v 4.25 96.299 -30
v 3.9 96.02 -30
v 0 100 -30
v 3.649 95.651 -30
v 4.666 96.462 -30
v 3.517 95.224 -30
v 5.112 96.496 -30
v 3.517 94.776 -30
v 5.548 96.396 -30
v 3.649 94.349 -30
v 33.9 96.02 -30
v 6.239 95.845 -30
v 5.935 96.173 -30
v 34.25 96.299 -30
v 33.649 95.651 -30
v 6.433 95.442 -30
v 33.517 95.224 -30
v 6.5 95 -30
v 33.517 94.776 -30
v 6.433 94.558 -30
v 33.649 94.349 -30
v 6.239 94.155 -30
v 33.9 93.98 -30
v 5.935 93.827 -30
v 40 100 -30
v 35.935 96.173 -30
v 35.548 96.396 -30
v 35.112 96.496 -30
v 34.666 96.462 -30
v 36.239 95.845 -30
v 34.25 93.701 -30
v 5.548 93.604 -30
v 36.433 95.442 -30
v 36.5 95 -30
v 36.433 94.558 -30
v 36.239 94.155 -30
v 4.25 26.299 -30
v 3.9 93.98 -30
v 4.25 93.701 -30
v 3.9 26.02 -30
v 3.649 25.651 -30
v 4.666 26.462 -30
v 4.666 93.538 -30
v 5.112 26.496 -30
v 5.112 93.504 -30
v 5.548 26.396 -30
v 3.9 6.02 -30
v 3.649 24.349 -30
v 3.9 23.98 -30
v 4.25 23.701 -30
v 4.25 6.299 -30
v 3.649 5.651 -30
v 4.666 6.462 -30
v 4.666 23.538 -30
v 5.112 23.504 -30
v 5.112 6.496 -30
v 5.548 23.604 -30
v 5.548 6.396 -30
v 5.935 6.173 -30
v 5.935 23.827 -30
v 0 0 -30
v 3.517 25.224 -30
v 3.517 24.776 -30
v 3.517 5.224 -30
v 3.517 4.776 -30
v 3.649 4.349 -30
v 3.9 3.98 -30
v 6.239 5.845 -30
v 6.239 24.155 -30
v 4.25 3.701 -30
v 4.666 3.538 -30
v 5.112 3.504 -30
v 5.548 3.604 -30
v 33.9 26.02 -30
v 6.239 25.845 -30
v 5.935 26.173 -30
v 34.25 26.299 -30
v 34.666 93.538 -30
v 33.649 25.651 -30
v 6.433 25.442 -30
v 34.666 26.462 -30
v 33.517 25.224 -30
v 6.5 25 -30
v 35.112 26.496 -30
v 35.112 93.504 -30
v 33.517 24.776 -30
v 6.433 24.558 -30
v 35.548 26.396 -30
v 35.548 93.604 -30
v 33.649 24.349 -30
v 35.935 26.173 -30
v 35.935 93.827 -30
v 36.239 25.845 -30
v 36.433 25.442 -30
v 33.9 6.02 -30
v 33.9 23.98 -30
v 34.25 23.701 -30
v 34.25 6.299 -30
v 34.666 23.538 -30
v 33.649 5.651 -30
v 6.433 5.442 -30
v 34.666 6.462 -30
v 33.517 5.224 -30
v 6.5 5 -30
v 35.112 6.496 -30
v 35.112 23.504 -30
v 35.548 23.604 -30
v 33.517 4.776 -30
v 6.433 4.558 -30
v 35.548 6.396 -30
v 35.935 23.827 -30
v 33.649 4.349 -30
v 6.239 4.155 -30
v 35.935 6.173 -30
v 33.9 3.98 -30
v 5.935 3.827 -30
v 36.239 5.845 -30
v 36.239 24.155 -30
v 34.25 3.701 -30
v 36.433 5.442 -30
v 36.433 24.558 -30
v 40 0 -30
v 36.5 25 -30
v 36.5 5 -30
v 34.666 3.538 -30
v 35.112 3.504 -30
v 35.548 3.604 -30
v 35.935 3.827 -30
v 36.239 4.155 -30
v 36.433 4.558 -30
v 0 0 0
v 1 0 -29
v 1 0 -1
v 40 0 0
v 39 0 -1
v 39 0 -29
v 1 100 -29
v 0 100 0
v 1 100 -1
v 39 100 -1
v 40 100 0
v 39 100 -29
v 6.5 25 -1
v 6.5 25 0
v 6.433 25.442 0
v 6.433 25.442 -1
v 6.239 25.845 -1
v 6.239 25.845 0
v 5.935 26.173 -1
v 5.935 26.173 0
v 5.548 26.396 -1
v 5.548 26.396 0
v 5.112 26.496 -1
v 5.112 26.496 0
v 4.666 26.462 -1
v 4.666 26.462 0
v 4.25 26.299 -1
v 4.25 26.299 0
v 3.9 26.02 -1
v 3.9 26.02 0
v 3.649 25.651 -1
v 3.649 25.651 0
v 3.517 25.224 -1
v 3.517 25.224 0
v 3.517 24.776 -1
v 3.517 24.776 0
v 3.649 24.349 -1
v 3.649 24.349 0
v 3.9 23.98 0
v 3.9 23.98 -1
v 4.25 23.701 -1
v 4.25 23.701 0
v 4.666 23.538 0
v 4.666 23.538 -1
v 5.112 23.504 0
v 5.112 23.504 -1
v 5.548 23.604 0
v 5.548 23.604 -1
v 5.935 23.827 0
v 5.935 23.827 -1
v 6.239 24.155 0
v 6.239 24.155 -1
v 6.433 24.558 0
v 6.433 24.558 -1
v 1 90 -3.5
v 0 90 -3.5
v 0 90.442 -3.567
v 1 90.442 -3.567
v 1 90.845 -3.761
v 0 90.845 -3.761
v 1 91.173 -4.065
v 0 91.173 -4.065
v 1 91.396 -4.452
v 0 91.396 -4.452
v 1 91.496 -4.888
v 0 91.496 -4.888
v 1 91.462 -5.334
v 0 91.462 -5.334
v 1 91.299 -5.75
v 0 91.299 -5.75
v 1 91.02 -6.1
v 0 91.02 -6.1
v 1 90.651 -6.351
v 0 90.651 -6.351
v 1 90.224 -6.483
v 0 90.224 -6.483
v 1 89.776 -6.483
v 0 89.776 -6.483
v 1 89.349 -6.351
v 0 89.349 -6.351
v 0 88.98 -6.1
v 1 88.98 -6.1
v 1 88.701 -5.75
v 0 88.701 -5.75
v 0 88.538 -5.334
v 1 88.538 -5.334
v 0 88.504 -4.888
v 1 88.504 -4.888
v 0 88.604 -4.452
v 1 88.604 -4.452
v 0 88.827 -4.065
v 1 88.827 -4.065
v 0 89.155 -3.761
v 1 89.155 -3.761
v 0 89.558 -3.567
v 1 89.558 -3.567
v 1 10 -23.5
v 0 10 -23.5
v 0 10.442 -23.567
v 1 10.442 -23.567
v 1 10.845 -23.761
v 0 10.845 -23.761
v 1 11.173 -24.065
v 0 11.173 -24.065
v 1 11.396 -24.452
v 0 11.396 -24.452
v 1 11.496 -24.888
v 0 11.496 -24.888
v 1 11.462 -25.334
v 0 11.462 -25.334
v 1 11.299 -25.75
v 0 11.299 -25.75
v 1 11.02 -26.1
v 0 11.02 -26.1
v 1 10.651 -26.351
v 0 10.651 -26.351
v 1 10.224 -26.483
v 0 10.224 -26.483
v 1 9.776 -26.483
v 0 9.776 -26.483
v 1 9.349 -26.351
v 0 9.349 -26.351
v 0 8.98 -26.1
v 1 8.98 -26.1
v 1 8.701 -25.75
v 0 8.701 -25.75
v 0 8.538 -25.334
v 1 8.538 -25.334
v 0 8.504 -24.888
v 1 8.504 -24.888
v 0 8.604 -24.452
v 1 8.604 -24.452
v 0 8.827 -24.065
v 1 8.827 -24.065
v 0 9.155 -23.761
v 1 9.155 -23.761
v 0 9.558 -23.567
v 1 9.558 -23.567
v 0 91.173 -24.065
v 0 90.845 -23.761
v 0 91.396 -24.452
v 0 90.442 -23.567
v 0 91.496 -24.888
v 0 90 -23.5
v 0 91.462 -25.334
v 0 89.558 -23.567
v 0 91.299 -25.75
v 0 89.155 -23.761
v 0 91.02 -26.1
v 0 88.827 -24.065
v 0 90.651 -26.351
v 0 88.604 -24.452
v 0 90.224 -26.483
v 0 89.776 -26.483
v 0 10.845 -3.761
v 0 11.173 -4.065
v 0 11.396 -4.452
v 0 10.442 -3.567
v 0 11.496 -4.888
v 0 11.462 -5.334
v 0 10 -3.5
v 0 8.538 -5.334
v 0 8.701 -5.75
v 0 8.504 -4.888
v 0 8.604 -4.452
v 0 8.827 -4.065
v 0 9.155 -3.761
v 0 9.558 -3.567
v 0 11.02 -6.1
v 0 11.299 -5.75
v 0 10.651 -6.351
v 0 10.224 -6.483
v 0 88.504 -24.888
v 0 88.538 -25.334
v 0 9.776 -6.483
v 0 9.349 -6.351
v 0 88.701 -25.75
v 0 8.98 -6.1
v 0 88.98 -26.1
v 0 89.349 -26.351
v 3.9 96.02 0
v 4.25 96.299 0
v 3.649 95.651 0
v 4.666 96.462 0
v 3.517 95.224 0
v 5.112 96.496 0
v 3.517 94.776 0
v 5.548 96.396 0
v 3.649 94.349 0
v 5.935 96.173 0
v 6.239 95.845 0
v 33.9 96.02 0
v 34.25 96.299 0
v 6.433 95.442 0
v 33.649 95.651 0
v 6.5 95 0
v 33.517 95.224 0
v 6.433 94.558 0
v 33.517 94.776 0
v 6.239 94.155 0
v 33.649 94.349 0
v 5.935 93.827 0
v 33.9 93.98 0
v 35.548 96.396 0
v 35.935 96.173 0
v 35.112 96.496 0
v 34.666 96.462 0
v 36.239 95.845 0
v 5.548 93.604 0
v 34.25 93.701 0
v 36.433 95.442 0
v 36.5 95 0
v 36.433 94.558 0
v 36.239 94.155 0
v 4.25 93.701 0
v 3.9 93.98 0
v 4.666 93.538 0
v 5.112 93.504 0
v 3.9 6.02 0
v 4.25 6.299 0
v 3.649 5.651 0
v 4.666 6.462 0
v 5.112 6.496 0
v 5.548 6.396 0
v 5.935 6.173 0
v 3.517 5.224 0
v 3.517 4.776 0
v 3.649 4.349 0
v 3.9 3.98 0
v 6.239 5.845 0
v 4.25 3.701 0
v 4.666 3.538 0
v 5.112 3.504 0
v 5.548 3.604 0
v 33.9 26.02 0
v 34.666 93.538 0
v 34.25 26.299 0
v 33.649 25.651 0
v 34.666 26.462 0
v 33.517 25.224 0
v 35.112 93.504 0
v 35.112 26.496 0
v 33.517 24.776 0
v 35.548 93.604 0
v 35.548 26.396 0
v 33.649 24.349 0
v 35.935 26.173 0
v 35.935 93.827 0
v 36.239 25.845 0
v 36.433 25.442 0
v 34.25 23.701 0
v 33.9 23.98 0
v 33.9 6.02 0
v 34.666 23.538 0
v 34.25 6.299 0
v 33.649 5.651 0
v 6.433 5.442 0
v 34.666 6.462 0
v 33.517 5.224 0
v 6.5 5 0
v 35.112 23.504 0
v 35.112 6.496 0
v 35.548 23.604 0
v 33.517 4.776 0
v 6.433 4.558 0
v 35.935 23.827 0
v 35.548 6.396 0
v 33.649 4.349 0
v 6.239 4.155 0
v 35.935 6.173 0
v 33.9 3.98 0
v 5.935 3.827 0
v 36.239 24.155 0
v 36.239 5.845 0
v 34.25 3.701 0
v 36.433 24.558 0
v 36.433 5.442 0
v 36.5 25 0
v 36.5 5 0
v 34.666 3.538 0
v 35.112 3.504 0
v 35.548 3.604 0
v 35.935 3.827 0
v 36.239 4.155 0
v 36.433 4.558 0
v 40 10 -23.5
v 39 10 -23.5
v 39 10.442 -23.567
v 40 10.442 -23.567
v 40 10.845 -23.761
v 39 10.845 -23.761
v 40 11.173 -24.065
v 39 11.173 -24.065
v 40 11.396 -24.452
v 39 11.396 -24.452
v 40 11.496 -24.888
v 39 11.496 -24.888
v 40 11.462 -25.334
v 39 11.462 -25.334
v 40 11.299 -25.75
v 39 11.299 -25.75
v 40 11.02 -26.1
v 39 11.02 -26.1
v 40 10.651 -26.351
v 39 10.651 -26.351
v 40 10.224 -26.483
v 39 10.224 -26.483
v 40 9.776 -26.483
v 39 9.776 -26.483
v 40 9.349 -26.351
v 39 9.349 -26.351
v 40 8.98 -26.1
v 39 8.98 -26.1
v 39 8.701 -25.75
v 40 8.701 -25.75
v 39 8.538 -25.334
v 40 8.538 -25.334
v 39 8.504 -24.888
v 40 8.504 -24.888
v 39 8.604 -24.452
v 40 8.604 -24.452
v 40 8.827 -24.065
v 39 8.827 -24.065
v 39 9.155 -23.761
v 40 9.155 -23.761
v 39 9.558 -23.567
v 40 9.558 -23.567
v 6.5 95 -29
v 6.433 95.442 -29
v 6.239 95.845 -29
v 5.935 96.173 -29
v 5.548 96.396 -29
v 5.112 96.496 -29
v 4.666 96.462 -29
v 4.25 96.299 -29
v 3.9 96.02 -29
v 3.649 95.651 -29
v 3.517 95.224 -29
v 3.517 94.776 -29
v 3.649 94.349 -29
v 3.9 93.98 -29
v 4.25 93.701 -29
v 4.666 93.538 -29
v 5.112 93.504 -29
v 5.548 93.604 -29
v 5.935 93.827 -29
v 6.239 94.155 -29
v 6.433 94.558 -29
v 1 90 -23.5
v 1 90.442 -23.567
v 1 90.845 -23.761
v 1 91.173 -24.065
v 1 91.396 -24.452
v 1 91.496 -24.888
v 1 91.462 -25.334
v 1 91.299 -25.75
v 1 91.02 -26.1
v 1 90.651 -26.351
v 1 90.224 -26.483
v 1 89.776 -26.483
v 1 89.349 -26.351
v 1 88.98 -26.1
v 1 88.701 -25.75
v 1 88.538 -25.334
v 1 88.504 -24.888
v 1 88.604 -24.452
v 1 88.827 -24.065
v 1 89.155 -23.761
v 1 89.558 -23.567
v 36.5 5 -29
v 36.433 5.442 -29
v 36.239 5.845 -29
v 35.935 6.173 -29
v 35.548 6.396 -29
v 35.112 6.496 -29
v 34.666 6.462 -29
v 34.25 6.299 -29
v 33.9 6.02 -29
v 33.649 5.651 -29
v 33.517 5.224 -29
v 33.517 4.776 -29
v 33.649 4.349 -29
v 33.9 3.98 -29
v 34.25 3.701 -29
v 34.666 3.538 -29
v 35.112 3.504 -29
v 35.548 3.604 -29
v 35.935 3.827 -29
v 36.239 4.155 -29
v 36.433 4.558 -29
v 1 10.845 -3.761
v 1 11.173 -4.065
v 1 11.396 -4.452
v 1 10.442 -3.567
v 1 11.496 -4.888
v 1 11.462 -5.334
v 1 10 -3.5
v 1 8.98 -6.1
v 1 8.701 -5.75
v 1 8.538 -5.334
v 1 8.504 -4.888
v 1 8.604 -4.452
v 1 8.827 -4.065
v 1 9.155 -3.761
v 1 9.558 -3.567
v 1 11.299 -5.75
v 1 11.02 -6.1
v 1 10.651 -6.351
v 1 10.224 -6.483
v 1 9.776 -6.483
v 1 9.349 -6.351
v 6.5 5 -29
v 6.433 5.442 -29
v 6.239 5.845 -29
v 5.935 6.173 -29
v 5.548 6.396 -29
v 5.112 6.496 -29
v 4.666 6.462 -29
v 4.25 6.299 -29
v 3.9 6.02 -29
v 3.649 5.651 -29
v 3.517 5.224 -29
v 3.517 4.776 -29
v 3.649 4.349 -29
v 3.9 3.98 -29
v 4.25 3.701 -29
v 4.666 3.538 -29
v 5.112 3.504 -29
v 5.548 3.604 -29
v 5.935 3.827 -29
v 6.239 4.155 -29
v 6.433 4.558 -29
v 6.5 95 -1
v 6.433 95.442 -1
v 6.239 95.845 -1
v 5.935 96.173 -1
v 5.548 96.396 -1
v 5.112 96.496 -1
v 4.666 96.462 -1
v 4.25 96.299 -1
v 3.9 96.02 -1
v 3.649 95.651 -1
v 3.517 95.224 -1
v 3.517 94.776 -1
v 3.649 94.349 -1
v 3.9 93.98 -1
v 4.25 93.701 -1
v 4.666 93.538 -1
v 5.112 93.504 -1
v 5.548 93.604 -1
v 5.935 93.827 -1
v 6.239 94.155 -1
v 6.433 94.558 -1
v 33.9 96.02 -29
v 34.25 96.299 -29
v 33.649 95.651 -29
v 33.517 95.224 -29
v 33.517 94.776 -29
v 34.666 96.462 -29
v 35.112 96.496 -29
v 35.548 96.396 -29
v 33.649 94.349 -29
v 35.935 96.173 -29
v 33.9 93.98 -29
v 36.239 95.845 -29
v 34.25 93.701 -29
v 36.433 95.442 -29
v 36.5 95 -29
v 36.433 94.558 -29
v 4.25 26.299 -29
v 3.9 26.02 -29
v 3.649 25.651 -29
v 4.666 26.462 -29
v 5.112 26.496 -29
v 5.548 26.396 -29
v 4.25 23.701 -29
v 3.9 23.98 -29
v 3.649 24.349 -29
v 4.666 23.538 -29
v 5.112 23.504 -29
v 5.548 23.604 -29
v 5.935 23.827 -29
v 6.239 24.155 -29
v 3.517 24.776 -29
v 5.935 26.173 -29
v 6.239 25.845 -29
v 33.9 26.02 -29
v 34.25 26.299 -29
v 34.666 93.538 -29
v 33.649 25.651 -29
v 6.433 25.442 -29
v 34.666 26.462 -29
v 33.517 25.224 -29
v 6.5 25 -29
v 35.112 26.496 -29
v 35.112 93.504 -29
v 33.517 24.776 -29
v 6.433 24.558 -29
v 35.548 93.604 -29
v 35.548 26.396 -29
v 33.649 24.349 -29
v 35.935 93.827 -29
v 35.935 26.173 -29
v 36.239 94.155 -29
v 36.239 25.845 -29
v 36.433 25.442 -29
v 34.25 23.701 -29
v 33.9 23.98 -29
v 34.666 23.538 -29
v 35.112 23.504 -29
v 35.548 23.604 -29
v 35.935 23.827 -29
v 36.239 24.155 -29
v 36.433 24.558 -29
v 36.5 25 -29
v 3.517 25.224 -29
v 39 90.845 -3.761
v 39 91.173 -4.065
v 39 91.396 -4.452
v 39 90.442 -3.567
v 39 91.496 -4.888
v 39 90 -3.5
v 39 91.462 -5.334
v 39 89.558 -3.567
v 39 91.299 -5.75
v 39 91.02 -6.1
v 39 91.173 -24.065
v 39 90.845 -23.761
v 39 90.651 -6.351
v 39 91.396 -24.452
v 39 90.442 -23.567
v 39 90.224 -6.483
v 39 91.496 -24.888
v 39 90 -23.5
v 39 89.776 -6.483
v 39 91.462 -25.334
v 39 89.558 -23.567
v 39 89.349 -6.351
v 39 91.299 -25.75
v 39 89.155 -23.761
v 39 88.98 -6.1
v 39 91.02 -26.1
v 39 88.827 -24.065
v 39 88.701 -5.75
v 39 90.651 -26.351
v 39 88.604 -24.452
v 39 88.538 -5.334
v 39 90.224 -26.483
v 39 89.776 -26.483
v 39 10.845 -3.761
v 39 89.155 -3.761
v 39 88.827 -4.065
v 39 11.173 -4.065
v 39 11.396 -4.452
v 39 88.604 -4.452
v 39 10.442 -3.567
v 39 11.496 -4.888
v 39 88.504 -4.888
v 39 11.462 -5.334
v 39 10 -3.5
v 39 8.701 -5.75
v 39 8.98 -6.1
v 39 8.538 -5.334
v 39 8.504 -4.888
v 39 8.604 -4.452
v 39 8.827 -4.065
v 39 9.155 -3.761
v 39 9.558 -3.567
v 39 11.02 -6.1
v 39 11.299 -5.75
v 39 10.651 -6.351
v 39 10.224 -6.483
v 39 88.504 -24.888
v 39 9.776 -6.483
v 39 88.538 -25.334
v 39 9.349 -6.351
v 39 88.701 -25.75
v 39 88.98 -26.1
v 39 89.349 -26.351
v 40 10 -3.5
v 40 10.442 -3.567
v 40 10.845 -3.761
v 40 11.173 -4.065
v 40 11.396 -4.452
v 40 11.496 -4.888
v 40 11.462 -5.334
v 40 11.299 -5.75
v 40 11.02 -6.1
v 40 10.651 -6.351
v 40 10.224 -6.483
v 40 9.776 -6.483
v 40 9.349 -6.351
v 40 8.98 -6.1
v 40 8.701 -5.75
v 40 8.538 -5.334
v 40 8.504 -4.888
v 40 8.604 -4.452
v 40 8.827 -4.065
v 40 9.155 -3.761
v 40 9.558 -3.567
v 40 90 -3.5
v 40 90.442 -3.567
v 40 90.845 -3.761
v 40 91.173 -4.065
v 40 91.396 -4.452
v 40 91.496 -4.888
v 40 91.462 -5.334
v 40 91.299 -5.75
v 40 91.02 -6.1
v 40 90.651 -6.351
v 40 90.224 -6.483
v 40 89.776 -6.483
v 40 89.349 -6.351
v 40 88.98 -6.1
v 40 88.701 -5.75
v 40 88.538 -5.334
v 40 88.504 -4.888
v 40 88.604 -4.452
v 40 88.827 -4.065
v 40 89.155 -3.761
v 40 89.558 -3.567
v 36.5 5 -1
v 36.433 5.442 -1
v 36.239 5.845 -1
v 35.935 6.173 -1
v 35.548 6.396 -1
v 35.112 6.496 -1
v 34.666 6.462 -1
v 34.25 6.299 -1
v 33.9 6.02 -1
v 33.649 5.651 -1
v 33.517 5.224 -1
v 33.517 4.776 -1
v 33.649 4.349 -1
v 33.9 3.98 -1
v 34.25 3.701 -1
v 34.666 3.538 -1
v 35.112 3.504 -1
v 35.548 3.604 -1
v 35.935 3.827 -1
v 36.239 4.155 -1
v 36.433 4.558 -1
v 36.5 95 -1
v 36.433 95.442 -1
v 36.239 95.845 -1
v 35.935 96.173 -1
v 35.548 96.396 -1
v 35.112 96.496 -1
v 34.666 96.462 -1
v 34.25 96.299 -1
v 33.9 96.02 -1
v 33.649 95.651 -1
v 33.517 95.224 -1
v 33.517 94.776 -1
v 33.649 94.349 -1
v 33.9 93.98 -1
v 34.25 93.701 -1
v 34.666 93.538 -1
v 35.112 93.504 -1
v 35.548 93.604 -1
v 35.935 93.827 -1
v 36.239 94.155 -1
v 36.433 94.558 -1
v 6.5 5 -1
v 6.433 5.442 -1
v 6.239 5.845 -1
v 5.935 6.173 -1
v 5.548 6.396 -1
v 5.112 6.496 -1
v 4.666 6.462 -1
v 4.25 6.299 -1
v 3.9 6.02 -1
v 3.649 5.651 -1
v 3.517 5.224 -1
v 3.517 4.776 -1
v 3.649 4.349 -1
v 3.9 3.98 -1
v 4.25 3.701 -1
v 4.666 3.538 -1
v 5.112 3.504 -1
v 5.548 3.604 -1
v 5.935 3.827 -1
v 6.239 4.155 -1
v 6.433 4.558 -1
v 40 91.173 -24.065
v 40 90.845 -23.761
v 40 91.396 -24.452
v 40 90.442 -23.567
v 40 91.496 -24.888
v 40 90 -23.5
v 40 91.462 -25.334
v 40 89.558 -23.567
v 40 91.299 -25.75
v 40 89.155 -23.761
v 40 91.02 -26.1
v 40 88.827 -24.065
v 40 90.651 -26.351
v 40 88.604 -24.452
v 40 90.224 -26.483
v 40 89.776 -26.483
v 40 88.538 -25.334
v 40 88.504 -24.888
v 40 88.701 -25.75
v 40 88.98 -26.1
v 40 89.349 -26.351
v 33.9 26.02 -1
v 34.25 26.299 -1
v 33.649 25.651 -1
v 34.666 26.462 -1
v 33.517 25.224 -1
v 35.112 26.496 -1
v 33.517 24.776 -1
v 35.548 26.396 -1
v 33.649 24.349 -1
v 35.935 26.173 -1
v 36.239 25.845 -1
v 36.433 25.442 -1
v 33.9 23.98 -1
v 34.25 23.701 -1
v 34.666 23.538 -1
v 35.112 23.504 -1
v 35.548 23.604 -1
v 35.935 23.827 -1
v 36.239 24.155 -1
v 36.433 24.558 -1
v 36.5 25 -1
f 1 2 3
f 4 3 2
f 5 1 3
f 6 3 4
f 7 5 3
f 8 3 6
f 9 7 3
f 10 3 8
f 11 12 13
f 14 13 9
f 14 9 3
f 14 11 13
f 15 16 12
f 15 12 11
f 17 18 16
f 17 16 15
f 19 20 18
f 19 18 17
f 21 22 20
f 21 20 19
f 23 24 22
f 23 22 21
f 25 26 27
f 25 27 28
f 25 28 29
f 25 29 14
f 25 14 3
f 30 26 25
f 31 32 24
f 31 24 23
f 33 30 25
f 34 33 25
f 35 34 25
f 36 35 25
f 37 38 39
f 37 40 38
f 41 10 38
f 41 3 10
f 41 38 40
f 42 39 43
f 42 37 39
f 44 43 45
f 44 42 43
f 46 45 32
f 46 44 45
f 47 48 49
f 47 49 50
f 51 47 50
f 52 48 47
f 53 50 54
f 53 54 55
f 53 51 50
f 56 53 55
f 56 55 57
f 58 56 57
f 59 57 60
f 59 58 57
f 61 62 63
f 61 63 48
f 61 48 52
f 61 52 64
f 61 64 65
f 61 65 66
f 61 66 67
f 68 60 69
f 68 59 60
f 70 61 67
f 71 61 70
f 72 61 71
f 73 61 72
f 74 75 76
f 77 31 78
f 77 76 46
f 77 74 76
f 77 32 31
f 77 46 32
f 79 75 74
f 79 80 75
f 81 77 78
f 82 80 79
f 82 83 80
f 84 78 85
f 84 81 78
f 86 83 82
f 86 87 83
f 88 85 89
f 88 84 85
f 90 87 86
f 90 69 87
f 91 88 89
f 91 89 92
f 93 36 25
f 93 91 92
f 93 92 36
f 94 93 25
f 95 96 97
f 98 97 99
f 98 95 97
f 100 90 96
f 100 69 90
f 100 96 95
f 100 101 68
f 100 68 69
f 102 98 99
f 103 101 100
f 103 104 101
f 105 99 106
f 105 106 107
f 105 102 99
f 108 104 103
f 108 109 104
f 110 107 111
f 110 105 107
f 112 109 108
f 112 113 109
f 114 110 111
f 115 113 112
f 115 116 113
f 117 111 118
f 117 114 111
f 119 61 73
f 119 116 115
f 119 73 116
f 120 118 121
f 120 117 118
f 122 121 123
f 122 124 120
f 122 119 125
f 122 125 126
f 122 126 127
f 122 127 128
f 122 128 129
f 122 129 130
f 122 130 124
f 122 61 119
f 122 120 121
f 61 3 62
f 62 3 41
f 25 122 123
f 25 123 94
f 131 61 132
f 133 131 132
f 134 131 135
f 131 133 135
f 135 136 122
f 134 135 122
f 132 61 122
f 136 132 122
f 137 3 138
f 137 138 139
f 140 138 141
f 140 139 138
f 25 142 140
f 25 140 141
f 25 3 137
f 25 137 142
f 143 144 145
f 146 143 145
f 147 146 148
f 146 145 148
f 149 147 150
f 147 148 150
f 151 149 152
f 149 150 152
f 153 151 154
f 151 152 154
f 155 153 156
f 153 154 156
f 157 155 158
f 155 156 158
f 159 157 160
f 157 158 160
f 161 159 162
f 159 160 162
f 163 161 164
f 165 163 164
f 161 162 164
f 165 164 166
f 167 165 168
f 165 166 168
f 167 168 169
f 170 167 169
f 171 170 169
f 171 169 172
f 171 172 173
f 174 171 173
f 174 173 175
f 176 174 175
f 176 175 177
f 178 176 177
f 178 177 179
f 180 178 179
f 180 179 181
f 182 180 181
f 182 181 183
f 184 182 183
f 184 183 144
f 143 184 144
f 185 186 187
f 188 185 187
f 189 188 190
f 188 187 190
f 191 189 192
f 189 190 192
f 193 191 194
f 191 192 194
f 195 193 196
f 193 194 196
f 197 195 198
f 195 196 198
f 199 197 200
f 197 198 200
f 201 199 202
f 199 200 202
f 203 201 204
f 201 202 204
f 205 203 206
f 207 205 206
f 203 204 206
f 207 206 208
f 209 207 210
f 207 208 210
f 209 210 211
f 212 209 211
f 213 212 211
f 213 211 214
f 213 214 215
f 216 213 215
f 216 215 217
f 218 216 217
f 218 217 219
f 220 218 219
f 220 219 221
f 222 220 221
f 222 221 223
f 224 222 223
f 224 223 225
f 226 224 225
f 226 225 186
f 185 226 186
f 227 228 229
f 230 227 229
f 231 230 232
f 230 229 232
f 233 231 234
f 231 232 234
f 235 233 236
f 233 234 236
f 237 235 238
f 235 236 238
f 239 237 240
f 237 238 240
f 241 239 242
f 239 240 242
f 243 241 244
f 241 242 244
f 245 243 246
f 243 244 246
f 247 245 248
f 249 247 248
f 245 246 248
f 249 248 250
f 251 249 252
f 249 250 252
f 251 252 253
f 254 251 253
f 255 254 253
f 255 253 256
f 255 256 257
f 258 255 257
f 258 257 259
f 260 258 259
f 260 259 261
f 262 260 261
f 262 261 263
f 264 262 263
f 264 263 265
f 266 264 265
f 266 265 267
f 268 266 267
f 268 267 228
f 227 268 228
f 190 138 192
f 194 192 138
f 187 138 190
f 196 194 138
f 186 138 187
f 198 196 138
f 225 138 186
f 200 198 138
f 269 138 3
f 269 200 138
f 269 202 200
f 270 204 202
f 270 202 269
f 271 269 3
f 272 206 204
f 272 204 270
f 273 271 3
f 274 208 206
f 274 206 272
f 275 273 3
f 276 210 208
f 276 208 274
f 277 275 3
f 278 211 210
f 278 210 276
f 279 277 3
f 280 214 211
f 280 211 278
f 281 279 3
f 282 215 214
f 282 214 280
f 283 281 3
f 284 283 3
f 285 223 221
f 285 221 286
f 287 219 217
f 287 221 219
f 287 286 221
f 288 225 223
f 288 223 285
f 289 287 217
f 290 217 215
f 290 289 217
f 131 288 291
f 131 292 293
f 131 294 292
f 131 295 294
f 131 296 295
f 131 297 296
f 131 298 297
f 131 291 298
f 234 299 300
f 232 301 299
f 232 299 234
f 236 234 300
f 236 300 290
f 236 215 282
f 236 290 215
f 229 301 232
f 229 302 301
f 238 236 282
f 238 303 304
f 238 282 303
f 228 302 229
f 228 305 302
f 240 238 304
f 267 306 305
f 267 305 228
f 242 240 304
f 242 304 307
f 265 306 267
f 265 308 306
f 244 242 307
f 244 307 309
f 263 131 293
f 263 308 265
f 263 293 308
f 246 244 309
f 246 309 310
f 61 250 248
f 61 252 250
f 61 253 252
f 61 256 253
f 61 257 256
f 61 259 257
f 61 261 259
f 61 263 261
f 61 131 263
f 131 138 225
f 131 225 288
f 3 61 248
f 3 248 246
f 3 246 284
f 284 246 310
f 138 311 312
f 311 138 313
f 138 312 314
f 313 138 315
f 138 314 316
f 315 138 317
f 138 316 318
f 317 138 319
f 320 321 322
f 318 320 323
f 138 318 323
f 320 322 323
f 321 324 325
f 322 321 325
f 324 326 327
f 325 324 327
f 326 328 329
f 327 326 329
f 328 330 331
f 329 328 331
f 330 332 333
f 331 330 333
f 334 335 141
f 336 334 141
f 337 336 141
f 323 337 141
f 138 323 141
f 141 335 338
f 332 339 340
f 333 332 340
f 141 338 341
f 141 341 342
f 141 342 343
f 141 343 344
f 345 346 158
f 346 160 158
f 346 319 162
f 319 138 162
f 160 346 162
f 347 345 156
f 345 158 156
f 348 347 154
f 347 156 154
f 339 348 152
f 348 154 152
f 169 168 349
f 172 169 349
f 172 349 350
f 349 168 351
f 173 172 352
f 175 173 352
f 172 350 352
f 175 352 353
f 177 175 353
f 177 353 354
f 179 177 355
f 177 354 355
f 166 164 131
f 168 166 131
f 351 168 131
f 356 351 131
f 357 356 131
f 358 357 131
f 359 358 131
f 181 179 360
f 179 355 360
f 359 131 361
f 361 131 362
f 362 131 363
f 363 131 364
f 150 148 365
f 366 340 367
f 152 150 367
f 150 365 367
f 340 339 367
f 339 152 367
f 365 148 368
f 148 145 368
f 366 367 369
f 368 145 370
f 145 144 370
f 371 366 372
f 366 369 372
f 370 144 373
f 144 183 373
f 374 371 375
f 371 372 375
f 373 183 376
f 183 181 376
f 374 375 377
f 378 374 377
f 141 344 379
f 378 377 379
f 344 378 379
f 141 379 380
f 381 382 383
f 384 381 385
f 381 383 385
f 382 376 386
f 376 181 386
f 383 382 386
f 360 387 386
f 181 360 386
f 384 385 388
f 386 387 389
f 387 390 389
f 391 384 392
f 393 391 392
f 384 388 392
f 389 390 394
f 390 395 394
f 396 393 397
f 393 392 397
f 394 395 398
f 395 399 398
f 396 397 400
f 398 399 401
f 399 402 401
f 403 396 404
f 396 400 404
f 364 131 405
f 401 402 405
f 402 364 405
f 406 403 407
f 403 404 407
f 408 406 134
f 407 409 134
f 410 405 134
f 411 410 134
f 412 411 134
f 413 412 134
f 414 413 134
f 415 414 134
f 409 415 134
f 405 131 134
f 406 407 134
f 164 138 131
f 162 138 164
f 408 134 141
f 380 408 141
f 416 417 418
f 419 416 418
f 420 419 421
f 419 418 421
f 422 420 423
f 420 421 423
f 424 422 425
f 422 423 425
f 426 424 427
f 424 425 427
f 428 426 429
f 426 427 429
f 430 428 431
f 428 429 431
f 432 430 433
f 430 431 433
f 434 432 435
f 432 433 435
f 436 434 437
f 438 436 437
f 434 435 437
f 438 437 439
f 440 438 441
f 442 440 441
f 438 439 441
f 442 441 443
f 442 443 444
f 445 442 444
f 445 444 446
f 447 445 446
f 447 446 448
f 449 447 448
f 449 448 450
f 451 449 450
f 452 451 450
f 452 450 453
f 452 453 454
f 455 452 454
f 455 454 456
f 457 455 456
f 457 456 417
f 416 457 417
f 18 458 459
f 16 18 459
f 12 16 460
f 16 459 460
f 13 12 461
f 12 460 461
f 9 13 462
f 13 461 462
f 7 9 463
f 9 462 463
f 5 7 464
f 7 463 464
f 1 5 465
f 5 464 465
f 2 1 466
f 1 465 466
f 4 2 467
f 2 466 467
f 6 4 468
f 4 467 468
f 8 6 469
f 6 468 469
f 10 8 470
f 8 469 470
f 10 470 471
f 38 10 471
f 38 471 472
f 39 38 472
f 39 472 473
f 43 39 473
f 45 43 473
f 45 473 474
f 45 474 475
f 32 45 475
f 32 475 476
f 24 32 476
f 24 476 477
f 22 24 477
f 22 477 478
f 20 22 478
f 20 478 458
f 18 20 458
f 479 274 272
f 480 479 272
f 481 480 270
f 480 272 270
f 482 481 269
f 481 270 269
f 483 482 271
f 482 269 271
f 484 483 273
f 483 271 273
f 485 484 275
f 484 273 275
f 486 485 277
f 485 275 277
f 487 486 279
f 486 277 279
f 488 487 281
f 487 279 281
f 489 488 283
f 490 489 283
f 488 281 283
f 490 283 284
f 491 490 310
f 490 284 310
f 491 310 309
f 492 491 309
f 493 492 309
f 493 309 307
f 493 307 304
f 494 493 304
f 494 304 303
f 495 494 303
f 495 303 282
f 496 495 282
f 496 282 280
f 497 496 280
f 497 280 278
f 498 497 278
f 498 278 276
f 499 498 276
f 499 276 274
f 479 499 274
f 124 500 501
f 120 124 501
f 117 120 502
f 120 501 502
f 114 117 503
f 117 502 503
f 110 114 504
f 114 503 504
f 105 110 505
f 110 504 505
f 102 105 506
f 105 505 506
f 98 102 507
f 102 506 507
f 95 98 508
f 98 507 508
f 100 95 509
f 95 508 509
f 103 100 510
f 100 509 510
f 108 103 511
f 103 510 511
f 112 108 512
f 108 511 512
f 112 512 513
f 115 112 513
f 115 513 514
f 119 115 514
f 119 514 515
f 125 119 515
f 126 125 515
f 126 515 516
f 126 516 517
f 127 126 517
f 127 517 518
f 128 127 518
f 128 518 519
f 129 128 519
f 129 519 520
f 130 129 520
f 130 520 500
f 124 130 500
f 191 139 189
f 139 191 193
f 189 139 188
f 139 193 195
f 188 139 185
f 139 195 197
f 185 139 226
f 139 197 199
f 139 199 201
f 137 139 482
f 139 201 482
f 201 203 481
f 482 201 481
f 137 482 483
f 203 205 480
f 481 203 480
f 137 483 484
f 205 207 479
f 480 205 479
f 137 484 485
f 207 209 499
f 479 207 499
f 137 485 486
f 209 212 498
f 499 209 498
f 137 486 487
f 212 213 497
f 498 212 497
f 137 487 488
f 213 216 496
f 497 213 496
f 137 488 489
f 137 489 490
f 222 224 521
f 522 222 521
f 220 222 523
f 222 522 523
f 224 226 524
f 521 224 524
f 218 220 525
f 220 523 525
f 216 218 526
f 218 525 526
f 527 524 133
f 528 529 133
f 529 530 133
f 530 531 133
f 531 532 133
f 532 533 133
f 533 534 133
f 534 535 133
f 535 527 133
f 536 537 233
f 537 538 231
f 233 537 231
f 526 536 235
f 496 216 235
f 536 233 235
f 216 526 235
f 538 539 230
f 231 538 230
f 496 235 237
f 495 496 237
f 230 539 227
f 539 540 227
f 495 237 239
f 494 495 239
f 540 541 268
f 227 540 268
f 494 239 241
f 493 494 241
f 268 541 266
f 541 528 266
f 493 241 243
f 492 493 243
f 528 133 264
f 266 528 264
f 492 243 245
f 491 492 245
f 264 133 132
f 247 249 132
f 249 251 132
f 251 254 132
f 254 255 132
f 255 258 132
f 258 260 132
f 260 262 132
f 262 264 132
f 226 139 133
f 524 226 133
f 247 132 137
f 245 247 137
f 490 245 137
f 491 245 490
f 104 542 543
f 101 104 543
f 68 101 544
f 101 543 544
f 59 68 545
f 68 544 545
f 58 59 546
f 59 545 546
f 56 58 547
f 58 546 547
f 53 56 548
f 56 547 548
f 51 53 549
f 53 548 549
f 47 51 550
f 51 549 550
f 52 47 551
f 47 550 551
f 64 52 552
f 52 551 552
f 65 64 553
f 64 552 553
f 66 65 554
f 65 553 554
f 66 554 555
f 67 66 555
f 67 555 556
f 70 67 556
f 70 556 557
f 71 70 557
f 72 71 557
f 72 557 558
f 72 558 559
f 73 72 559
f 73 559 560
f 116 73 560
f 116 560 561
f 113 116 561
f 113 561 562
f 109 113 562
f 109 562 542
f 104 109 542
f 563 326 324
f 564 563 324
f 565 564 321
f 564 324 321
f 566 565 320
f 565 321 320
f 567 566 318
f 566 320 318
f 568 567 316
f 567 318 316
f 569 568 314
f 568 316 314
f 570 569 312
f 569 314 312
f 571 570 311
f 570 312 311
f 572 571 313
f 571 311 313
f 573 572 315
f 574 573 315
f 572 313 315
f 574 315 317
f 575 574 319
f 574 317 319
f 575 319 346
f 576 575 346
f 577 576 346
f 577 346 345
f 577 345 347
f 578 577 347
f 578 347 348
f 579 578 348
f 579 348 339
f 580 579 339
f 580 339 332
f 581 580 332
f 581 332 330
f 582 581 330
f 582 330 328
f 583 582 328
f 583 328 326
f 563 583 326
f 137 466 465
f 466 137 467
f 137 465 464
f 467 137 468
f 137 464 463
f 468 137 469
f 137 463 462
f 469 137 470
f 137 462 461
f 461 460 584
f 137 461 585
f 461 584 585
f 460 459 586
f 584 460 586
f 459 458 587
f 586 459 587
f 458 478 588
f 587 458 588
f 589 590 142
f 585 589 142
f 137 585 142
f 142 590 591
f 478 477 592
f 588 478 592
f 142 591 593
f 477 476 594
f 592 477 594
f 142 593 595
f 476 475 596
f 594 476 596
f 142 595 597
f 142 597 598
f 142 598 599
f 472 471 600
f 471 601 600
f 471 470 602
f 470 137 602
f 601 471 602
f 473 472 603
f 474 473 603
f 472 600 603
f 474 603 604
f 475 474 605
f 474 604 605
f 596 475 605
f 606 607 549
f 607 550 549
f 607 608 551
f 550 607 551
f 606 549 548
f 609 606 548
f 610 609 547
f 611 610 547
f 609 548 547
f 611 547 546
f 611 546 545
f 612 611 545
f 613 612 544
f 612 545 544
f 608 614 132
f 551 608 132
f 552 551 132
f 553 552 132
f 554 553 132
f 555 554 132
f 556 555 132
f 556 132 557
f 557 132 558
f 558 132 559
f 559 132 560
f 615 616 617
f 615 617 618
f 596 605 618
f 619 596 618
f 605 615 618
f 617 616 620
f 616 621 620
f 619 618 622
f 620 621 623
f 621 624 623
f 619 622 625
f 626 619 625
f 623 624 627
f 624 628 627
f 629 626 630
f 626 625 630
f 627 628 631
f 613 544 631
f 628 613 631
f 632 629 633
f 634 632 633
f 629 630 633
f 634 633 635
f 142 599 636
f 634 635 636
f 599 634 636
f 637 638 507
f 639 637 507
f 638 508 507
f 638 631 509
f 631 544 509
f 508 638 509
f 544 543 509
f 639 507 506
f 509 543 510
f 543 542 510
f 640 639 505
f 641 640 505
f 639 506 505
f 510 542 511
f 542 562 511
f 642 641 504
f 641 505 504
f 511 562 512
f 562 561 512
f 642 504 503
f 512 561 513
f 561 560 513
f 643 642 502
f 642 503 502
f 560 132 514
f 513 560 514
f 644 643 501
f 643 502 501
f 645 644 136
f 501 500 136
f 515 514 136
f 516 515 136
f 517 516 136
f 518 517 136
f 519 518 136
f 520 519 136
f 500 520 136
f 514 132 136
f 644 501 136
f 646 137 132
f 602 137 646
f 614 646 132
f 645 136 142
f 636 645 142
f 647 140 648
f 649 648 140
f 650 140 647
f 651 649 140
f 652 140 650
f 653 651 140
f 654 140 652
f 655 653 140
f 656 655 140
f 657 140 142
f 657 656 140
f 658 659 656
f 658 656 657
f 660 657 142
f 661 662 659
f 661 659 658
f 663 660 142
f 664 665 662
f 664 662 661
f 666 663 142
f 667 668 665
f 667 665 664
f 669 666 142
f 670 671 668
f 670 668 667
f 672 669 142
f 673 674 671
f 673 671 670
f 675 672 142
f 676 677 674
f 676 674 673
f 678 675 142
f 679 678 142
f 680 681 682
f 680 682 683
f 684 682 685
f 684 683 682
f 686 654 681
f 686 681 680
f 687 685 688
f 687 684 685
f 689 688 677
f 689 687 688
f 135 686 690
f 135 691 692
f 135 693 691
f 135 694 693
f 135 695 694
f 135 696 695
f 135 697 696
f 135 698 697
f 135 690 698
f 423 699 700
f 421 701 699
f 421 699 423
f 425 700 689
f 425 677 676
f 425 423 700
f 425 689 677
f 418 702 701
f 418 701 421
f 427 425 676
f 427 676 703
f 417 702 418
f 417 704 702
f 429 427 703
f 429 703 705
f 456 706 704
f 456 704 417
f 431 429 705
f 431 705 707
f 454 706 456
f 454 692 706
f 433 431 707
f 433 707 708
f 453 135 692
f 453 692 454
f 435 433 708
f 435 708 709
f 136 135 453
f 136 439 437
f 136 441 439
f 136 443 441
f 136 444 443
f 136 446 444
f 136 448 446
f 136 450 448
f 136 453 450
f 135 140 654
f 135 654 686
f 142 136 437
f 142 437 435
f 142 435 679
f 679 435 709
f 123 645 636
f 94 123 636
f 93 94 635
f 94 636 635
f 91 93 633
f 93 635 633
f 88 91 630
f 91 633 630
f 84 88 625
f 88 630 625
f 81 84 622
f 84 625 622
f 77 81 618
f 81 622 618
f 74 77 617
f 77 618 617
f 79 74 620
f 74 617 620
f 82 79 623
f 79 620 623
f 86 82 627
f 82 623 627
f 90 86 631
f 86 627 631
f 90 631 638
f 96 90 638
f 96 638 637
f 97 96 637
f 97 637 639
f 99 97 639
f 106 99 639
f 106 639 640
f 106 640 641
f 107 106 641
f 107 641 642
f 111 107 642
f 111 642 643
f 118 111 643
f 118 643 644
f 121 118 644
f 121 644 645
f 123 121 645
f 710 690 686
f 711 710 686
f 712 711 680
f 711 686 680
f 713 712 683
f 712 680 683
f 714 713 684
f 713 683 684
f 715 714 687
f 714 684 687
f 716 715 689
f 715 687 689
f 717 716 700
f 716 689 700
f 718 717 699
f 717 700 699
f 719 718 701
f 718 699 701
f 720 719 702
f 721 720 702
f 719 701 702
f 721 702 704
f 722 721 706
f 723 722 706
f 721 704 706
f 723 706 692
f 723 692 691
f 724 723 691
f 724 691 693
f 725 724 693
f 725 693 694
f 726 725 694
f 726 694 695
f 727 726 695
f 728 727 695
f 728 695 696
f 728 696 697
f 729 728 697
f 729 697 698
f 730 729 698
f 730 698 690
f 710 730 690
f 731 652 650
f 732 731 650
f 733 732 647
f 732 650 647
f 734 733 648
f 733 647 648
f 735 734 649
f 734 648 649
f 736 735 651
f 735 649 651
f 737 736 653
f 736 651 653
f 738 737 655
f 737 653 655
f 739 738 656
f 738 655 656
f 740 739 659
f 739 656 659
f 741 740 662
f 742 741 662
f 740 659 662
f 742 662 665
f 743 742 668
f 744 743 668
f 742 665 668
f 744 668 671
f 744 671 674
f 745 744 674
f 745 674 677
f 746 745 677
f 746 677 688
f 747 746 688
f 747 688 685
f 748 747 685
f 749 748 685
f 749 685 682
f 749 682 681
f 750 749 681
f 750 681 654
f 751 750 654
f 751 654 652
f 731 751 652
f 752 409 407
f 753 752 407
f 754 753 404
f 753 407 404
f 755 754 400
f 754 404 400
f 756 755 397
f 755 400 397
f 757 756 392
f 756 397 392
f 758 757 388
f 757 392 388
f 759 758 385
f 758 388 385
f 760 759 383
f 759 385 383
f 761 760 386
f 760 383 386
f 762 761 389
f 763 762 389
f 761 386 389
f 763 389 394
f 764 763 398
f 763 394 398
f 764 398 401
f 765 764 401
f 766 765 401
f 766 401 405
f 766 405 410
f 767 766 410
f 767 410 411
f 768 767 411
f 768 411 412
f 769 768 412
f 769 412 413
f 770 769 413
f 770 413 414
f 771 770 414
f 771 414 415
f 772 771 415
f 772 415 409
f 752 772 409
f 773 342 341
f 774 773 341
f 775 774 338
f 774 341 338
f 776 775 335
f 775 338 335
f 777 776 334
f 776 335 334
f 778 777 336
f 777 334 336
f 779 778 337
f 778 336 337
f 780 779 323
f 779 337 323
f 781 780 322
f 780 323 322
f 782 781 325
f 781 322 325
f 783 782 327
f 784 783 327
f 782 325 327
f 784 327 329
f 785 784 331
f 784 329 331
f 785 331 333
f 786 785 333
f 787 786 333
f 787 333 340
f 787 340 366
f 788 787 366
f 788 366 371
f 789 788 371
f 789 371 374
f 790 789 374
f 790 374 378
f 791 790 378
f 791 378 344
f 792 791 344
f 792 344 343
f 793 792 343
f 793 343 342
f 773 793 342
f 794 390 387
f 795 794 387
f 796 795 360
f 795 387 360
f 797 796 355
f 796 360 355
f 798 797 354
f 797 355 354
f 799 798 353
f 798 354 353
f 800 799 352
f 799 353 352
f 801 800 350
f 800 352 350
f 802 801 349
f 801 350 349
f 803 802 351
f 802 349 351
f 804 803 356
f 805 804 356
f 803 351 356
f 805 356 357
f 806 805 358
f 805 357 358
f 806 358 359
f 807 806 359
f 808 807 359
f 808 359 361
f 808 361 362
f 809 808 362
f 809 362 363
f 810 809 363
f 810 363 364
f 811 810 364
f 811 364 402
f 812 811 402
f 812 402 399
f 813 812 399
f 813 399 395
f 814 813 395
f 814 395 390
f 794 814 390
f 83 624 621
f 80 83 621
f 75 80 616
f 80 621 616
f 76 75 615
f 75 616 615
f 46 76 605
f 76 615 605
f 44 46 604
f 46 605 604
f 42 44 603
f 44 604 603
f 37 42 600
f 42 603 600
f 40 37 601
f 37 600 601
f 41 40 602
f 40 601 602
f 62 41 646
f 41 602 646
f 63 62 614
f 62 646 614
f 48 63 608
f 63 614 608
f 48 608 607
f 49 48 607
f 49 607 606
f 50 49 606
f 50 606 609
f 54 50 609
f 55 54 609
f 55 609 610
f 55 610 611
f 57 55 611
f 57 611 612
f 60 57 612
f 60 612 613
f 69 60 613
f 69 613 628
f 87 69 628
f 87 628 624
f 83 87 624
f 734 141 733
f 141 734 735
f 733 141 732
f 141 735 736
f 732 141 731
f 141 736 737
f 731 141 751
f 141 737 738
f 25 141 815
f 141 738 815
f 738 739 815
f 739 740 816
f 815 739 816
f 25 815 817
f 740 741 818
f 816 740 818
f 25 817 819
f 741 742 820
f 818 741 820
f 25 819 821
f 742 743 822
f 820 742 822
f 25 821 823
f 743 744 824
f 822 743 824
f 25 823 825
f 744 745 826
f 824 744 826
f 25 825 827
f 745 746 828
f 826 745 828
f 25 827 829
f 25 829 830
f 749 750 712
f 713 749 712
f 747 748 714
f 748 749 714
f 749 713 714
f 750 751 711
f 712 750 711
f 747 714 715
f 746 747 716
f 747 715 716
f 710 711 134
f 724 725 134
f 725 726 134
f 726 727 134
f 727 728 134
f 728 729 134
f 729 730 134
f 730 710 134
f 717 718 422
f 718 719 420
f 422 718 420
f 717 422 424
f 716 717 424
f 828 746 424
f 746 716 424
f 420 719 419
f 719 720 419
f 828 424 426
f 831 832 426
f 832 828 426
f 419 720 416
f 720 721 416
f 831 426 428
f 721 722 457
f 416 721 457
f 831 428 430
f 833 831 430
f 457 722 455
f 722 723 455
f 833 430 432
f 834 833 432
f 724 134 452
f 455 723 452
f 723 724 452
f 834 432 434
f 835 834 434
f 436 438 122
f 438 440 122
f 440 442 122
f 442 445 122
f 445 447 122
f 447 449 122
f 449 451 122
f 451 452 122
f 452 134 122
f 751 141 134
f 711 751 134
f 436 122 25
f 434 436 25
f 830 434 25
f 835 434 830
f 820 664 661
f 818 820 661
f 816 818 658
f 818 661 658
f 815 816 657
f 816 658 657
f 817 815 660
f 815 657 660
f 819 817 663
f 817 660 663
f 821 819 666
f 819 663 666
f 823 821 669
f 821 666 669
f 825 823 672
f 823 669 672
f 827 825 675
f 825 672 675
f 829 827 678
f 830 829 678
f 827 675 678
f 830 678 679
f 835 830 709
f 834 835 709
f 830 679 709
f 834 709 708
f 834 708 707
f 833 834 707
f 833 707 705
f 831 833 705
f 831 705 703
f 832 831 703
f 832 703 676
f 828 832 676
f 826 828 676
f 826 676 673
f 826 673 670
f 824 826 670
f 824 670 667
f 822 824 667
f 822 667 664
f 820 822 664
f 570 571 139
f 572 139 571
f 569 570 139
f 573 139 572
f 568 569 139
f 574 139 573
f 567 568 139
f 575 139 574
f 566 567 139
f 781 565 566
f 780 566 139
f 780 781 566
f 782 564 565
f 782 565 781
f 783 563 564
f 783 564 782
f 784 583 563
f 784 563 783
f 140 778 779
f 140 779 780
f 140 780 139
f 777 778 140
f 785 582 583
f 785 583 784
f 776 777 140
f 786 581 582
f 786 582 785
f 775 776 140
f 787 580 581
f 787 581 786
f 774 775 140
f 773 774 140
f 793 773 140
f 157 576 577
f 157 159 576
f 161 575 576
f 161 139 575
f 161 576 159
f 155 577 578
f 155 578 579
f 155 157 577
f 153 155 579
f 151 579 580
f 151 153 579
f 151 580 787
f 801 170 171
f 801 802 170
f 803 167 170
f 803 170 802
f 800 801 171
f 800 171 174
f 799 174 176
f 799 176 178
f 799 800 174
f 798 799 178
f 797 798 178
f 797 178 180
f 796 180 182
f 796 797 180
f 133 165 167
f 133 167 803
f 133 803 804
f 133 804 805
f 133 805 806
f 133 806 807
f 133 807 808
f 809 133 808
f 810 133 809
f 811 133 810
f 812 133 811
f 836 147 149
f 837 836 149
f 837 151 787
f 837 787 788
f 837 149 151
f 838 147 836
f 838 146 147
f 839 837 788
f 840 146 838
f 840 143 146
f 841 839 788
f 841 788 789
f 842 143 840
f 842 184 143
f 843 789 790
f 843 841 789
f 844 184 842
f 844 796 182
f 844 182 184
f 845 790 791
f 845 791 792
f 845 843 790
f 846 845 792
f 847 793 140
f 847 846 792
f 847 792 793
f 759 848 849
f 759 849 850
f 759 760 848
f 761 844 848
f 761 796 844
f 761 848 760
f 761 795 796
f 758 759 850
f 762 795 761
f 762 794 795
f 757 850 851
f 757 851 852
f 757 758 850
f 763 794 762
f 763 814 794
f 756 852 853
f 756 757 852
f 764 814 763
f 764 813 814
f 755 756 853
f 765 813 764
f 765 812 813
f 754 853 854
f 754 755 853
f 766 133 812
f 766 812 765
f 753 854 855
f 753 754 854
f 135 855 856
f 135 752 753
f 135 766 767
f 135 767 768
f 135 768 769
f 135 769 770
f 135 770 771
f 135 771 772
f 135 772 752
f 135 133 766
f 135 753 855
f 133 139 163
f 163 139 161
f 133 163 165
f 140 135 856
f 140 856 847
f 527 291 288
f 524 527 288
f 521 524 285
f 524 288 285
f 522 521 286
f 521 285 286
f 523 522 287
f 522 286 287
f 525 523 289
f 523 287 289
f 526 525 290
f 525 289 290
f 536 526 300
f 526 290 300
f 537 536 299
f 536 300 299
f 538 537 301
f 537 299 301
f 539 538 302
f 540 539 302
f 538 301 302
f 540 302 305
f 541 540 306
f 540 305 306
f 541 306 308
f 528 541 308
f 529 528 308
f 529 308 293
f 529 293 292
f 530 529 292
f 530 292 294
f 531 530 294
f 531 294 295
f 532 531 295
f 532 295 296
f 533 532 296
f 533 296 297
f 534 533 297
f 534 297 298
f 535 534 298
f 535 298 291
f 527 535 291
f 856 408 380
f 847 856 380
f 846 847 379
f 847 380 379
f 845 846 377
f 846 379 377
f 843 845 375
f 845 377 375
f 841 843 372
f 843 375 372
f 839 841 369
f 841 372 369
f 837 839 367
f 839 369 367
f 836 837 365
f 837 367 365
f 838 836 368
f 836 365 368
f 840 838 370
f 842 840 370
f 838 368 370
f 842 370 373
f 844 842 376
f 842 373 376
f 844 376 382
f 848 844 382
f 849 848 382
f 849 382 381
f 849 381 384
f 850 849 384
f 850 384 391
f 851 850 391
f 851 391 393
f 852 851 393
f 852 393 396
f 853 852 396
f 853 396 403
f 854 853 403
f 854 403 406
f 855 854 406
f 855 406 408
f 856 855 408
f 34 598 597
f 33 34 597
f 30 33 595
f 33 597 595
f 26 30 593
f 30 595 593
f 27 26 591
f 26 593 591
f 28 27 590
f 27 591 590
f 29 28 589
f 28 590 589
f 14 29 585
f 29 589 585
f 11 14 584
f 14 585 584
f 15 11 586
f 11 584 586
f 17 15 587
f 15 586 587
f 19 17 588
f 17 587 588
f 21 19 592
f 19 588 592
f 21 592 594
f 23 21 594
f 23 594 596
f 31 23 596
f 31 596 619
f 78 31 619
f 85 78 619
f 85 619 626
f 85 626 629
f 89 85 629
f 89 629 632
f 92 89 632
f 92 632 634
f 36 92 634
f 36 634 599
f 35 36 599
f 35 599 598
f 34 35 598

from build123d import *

# Parameters (mm, degrees)
SKETCH_1_W          = 40
SKETCH_1_H          = 30
SKETCH_1_W_2        = 38
SKETCH_1_H_2        = 28
EXTRUDE_1_DEPTH     = 100
SKETCH_2_R          = 1.5
CUT_EXTRUDE_1_DEPTH = 112.803398875
SKETCH_3_R          = 1.5
CUT_EXTRUDE_2_DEPTH = 112.803398875


with BuildPart() as part:
    # 草图1 → 拉伸-薄壁1 (new body)
    with BuildSketch(Plane(origin=(0, 0, 0), x_dir=(1, 0, 0), z_dir=(0, 1, 0))):
        with Locations((20, 15)):
            Rectangle(SKETCH_1_W, SKETCH_1_H)
        with Locations((20, 15)):
            Rectangle(SKETCH_1_W_2, SKETCH_1_H_2, mode=Mode.SUBTRACT)
    extrude(amount=EXTRUDE_1_DEPTH)

    # 草图2 → 切除-拉伸1 (cut, through all)
    with BuildSketch(Plane.XY):
        with Locations((5, 95)):
            Circle(SKETCH_2_R)
        with Locations((35, 95)):
            Circle(SKETCH_2_R)
        with Locations((35, 25)):
            Circle(SKETCH_2_R)
        with Locations((5, 25)):
            Circle(SKETCH_2_R)
        with Locations((5, 5)):
            Circle(SKETCH_2_R)
        with Locations((35, 5)):
            Circle(SKETCH_2_R)
    extrude(amount=-CUT_EXTRUDE_1_DEPTH, mode=Mode.SUBTRACT)

    # 草图3 → 切除-拉伸2 (cut, through all)
    with BuildSketch(Plane.ZY):
        with Locations((-25, 90)):
            Circle(SKETCH_3_R)
        with Locations((-5, 90)):
            Circle(SKETCH_3_R)
        with Locations((-25, 10)):
            Circle(SKETCH_3_R)
        with Locations((-5, 10)):
            Circle(SKETCH_3_R)
    extrude(amount=-CUT_EXTRUDE_2_DEPTH, mode=Mode.SUBTRACT)


solid = part.part
